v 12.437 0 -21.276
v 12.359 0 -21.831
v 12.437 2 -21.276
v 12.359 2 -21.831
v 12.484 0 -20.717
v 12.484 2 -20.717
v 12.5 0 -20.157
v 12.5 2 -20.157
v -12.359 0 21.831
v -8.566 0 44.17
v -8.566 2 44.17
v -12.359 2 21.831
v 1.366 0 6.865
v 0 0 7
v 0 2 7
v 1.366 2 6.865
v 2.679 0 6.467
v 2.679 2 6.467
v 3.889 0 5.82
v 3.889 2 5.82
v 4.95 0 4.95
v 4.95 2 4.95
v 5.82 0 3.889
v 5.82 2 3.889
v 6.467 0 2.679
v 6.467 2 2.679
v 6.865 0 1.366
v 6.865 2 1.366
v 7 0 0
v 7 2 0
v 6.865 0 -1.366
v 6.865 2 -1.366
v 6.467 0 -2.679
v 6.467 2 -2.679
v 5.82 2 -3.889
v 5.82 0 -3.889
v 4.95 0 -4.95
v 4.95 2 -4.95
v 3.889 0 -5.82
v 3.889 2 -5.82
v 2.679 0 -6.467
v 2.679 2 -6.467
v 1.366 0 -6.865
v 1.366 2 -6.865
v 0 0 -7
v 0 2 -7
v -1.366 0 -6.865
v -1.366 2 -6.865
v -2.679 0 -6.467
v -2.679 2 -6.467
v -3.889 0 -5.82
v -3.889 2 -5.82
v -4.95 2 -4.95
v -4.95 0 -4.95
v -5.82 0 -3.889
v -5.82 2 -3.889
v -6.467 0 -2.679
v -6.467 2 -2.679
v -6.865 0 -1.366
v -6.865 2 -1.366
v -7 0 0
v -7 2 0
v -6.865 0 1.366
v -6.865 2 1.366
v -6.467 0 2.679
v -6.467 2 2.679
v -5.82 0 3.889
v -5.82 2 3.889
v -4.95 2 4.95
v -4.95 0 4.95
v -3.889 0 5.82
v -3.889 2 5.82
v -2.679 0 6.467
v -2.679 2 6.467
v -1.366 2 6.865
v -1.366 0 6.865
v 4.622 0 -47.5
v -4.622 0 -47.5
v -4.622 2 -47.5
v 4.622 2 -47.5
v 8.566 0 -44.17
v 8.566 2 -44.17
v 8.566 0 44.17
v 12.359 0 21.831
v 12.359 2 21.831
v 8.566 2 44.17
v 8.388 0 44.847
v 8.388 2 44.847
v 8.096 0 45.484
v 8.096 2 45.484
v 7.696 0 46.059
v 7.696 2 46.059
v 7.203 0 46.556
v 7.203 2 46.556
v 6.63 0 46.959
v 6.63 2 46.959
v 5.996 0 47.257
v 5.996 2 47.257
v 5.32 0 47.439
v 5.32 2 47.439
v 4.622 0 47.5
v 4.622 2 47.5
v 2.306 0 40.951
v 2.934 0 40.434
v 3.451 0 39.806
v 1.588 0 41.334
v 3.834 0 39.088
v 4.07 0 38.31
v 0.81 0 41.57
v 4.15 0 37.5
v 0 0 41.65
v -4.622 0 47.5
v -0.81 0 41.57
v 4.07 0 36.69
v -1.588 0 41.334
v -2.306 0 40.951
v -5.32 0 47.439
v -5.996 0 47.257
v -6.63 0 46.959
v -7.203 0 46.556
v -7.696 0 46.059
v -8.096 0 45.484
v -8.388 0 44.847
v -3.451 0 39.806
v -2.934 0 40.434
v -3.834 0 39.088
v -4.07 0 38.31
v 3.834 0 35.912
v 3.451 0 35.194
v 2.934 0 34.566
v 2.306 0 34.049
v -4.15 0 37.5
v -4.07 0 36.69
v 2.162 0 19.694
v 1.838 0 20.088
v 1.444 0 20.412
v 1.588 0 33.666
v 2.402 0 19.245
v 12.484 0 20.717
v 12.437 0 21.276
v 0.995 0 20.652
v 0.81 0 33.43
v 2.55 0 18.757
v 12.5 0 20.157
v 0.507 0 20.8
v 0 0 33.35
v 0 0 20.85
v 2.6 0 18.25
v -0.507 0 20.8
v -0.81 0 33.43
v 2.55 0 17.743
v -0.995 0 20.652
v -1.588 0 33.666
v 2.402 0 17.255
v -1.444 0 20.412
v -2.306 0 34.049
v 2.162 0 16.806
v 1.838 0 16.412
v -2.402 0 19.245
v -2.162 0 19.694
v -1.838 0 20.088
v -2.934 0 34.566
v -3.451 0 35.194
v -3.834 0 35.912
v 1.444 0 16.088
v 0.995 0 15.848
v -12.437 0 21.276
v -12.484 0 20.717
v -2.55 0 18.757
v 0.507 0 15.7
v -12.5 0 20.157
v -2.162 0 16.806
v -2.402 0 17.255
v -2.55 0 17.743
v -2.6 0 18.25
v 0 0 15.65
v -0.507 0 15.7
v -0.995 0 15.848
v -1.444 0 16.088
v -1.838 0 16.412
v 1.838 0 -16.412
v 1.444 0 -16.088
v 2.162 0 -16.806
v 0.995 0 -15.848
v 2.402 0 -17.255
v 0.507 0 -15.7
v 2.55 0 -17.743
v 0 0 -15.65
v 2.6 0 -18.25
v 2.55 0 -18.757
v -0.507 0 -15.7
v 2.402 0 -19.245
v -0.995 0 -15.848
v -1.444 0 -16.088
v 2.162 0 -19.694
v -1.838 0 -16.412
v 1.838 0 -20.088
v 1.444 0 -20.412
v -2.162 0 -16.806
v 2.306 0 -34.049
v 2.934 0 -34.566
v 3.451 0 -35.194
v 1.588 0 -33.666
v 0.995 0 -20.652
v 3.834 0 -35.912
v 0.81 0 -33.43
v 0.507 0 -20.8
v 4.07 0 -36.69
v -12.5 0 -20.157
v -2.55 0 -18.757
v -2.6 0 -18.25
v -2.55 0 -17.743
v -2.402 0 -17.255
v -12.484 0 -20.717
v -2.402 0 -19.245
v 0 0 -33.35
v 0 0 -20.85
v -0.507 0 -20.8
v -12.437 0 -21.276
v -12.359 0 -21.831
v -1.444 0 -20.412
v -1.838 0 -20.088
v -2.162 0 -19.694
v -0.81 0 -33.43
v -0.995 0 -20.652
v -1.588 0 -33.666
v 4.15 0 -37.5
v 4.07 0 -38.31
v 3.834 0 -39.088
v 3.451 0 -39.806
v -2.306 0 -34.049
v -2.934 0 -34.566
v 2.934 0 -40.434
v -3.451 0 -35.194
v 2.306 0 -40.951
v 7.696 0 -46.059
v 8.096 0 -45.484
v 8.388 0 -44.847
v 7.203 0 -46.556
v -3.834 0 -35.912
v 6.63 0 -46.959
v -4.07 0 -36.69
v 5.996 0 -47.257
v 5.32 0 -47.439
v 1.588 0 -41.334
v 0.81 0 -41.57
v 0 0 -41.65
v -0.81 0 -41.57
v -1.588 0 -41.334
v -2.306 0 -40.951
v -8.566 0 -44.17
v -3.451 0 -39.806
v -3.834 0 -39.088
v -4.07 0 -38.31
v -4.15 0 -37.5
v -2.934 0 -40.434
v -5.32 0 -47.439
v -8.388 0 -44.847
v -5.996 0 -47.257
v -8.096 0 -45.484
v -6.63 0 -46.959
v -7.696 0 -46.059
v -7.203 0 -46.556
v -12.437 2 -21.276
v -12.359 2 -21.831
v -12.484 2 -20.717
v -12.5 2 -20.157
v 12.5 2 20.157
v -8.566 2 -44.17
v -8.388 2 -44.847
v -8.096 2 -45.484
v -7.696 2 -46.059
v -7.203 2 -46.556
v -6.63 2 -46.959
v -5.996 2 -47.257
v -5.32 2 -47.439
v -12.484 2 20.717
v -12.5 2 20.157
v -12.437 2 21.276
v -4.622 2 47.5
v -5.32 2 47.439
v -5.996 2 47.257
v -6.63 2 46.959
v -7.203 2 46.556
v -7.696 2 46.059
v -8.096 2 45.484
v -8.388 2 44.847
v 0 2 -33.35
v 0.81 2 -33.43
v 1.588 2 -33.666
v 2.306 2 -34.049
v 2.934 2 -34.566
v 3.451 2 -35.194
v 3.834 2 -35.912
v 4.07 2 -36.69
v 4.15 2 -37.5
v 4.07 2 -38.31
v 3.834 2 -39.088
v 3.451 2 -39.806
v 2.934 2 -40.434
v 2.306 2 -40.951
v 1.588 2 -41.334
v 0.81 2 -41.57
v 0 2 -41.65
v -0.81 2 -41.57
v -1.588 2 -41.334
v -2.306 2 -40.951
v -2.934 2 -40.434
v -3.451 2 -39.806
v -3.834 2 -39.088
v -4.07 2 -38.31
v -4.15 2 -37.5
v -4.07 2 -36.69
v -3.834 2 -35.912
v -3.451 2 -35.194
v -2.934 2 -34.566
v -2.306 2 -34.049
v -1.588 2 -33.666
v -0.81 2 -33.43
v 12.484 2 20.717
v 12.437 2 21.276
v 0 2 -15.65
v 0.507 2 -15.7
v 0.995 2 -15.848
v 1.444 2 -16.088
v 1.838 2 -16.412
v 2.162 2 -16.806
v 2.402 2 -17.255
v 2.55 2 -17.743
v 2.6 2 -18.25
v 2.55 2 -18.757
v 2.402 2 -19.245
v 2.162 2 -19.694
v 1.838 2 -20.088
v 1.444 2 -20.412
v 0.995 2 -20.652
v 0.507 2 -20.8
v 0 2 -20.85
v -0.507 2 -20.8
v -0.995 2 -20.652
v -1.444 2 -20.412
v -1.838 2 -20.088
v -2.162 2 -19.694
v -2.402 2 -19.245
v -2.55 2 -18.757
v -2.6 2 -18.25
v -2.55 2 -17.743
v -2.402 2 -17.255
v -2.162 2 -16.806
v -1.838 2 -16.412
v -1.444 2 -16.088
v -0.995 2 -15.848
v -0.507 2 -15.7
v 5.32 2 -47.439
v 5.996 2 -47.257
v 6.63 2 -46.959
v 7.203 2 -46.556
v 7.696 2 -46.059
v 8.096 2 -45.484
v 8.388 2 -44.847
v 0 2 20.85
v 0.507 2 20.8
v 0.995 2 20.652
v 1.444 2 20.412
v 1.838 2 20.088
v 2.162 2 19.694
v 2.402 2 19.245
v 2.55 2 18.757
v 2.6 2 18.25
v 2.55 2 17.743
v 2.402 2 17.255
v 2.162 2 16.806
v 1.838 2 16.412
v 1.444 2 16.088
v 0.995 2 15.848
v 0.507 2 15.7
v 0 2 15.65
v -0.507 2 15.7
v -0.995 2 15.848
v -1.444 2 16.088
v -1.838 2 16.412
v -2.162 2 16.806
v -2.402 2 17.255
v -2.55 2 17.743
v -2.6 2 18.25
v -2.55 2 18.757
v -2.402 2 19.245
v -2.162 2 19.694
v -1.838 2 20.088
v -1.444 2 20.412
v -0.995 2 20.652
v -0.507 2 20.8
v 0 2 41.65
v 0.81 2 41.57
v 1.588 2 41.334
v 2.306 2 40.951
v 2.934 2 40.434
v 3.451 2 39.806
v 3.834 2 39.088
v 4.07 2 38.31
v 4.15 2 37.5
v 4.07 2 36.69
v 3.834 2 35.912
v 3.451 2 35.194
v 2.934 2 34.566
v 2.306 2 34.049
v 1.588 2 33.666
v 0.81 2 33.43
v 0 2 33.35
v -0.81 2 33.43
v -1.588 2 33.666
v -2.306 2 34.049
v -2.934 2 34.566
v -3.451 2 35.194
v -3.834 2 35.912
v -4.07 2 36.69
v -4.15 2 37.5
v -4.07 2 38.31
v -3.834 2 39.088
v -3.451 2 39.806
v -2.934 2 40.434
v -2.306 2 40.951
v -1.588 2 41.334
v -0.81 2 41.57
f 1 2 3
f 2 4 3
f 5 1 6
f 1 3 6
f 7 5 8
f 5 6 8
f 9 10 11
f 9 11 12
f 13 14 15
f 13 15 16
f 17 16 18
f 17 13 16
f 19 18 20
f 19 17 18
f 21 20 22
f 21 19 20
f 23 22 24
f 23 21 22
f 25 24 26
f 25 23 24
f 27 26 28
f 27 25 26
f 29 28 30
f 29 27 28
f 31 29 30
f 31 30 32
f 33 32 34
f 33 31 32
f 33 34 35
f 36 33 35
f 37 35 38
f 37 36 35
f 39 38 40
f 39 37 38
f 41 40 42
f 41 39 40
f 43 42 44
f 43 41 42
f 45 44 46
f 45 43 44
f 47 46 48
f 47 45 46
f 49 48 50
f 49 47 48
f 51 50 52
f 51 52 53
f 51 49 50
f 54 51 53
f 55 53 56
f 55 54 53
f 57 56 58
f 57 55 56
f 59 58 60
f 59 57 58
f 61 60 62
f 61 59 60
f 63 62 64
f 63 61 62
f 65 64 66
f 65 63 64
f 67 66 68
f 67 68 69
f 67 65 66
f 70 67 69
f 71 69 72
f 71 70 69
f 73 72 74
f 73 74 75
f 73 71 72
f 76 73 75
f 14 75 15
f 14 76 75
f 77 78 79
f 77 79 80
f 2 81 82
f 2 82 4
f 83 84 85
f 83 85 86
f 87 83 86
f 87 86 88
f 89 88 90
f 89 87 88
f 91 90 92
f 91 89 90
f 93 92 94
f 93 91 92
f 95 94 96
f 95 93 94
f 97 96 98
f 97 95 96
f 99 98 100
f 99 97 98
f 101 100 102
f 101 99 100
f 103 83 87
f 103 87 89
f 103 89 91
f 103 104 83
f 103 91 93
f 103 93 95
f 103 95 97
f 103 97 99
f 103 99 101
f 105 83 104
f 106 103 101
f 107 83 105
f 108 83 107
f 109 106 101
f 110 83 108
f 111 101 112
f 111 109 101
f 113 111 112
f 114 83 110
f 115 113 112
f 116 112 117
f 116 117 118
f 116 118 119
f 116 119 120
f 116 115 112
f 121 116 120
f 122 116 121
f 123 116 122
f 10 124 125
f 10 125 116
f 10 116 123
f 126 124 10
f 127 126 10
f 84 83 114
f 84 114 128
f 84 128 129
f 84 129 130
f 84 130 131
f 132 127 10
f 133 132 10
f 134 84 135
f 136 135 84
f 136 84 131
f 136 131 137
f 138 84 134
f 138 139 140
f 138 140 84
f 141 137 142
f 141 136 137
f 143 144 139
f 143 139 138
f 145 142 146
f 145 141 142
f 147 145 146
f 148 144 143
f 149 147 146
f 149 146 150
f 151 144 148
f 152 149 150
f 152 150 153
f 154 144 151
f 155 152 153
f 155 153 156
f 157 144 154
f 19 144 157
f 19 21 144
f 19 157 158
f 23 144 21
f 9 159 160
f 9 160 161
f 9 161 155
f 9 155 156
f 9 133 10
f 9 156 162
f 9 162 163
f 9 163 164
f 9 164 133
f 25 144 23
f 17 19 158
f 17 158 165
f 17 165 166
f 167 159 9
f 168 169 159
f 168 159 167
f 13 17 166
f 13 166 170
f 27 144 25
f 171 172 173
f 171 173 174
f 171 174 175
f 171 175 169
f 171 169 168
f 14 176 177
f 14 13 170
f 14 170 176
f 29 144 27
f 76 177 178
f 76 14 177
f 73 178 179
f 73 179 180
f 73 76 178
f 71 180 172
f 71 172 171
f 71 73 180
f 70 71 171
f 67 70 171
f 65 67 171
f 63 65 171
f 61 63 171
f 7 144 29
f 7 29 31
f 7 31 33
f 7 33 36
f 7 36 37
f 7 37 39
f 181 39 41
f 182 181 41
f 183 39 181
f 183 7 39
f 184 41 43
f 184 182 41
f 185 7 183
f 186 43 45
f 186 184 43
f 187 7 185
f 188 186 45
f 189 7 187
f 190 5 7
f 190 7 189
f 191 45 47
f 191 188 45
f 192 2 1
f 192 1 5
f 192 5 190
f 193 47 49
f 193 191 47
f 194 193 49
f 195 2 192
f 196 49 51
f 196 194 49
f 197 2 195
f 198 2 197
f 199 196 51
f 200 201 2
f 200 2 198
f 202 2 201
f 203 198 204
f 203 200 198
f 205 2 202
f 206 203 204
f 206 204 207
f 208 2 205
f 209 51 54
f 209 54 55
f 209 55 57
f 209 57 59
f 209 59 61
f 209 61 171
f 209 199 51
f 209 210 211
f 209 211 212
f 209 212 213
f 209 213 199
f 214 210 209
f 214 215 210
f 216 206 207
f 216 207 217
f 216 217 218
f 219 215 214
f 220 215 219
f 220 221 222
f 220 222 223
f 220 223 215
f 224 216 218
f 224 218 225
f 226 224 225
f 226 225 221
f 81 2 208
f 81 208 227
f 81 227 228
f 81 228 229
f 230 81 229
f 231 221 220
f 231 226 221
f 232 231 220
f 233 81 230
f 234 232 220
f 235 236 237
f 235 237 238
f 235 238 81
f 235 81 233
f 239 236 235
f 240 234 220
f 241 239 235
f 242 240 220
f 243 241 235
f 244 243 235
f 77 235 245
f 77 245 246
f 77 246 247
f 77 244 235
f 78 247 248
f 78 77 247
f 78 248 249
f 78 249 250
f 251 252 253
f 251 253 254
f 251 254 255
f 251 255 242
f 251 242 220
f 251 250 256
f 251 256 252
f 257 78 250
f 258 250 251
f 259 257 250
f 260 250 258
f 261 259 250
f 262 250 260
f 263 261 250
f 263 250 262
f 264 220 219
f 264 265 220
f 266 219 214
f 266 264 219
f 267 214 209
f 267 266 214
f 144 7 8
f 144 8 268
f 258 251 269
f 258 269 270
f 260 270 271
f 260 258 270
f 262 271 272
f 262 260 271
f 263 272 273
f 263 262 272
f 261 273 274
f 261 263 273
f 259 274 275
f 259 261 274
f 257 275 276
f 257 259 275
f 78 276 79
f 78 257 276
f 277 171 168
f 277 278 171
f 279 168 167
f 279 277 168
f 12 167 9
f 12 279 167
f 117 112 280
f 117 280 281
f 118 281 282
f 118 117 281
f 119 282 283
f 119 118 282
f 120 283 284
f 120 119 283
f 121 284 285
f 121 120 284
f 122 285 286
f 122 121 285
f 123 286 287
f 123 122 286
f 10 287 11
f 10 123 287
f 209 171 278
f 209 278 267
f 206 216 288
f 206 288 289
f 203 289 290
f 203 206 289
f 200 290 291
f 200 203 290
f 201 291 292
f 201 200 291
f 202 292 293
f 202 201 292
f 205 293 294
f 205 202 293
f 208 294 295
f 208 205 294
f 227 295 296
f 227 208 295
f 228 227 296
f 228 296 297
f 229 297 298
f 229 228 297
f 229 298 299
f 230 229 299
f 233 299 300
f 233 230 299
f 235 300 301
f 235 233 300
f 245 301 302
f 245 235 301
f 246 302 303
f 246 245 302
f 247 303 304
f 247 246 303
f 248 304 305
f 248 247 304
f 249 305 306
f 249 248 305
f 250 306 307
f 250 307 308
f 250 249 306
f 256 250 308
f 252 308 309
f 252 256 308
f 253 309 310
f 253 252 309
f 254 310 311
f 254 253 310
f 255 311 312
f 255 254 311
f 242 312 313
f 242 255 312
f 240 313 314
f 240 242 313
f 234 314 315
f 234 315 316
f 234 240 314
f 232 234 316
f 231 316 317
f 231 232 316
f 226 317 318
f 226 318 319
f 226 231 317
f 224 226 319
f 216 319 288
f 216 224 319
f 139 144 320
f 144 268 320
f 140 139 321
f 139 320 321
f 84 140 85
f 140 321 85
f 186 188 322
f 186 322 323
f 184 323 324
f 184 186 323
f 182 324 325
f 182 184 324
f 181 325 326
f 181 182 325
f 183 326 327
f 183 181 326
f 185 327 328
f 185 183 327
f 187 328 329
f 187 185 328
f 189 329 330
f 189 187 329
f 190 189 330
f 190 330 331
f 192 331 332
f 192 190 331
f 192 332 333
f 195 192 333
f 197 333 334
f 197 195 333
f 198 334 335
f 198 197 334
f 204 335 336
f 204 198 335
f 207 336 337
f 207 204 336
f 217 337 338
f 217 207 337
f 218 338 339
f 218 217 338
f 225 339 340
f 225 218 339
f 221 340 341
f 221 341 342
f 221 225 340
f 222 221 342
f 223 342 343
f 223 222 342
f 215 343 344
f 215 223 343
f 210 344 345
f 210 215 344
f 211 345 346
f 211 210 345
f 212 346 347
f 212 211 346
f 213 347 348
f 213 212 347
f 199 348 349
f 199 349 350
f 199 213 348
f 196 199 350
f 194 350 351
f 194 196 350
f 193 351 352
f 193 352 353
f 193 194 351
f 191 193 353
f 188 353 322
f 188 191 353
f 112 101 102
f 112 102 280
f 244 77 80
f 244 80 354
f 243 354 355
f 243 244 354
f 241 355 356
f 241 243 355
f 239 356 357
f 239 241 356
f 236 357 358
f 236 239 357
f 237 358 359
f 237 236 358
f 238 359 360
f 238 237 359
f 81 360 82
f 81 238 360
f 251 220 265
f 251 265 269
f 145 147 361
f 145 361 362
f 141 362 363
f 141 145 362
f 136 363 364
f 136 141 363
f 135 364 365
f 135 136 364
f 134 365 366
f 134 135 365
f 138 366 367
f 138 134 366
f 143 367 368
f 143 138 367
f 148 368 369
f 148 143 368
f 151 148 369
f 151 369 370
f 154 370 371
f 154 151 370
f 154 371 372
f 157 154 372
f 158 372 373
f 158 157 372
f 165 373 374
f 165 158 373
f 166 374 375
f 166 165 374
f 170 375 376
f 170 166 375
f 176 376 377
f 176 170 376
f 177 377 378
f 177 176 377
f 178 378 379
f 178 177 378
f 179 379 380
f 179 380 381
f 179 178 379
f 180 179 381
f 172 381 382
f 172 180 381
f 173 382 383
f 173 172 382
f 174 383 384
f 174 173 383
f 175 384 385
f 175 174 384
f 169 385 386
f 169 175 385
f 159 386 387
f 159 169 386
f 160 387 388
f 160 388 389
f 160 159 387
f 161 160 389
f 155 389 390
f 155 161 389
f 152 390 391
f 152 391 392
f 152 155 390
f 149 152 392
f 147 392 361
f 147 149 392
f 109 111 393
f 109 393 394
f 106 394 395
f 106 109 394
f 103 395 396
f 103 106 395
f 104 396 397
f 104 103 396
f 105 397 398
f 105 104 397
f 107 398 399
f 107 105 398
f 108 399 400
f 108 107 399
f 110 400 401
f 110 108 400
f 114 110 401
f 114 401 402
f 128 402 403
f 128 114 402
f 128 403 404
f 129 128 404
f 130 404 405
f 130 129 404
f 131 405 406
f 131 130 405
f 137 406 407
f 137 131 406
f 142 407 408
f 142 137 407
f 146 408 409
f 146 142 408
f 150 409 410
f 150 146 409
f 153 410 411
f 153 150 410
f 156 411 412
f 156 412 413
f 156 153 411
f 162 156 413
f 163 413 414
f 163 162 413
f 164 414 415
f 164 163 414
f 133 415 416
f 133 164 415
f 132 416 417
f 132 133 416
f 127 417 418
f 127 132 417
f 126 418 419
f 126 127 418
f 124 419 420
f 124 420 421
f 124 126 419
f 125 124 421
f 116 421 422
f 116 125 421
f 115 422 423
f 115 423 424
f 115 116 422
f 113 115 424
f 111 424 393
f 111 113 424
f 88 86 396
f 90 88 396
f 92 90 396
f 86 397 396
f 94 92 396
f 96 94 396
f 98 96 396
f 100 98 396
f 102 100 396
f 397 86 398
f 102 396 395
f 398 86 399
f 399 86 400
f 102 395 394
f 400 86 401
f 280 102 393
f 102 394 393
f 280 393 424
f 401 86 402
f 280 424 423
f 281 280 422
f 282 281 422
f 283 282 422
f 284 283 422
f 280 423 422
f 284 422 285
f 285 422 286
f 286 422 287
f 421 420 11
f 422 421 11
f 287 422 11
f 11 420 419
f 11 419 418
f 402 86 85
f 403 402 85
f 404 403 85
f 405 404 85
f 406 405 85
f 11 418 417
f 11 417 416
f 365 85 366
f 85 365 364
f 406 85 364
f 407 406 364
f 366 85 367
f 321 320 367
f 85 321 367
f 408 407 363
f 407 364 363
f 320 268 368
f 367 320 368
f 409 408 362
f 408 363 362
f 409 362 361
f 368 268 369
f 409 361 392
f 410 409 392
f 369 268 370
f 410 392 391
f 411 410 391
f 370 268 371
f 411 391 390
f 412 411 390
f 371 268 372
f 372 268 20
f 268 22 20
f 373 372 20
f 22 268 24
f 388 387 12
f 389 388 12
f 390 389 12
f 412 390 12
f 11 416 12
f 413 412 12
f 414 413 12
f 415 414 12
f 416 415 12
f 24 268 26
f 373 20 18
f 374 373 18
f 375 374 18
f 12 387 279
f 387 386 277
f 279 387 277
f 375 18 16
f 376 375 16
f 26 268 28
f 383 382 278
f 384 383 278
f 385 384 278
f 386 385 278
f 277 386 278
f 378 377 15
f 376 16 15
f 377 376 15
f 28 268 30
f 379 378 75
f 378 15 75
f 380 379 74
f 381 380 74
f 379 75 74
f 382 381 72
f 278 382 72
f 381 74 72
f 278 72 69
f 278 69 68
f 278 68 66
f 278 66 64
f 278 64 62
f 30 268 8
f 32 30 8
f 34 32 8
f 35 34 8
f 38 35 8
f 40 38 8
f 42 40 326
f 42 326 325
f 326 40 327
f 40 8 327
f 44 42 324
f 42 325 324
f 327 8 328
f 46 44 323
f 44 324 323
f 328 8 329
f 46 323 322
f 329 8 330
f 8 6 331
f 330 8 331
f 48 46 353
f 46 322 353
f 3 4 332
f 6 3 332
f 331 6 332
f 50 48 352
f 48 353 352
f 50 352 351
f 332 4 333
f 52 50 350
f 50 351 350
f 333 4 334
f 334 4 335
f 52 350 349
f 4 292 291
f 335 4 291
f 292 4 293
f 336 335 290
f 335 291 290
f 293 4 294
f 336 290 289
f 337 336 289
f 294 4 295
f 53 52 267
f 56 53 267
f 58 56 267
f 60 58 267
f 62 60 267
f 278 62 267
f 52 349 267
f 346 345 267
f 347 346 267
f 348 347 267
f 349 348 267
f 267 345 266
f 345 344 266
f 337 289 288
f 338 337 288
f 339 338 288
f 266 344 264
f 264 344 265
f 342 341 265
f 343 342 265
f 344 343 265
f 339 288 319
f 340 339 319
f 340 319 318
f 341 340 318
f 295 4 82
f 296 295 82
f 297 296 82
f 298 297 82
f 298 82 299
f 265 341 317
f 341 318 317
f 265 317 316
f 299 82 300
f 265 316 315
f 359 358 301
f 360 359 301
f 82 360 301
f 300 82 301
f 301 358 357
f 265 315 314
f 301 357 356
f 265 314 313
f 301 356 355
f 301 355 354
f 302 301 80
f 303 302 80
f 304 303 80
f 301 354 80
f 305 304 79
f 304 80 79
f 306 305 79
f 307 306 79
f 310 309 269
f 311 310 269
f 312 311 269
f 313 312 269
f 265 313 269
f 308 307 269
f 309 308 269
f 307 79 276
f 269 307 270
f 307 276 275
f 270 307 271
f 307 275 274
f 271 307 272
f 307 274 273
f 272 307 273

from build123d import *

# Parameters (mm, degrees)
SKETCH1_R           = 7
SKETCH1_R_2         = 4.15
SKETCH1_R_3         = 2.6
BOSS_EXTRUDE1_DEPTH = 2
FILLET1_R           = 10


with BuildPart() as part:
    # Sketch1 → Boss-Extrude1 (new body)
    with BuildSketch(Plane(origin=(0, 0, 0), x_dir=(1, 0, 0), z_dir=(0, 1, 0))):
        with BuildLine():
            Line((-4.621983379, 47.5), (4.621983379, 47.5))
            ThreePointArc((4.621983379, 47.5), (7.202813169, 46.556029711), (8.565529638, 44.169658799))
            Line((8.565529638, 44.169658799), (12.5, 21))
            Line((12.5, 21), (12.5, -21))
            Line((12.5, -21), (8.565529638, -44.169658799))
            ThreePointArc((8.565529638, -44.169658799), (7.202813169, -46.556029711), (4.621983379, -47.5))
            Line((4.621983379, -47.5), (-4.621983379, -47.5))
            ThreePointArc((-4.621983379, -47.5), (-7.202813169, -46.556029711), (-8.565529638, -44.169658799))
            Line((-8.565529638, -44.169658799), (-12.5, -21))
            Line((-12.5, -21), (-12.5, 21))
            Line((-12.5, 21), (-8.565529638, 44.169658799))
            ThreePointArc((-8.565529638, 44.169658799), (-7.202813169, 46.556029711), (-4.621983379, 47.5))
        make_face()
        with Locations(Location((0, 0, 0), (0, 0, 270))):
            Circle(SKETCH1_R, mode=Mode.SUBTRACT)
        with Locations(Location((0, 37.5, 0), (0, 0, 270))):
            Circle(SKETCH1_R_2, mode=Mode.SUBTRACT)
        with Locations(Location((0, -37.5, 0), (0, 0, 270))):
            Circle(SKETCH1_R_2, mode=Mode.SUBTRACT)
        with Locations(Location((0, 18.25, 0), (0, 0, 270))):
            Circle(SKETCH1_R_3, mode=Mode.SUBTRACT)
        with Locations(Location((0, -18.25, 0), (0, 0, 270))):
            Circle(SKETCH1_R_3, mode=Mode.SUBTRACT)
    extrude(amount=BOSS_EXTRUDE1_DEPTH)

    # Fillet1
    fillet1_edges = [part.edges().sort_by_distance(p)[0] for p in [
        (-12.5, 1, 21),
        (-12.5, 1, -21),
        (12.5, 1, -21),
        (12.5, 1, 21),
    ]]
    fillet(fillet1_edges, radius=FILLET1_R)


solid = part.part
